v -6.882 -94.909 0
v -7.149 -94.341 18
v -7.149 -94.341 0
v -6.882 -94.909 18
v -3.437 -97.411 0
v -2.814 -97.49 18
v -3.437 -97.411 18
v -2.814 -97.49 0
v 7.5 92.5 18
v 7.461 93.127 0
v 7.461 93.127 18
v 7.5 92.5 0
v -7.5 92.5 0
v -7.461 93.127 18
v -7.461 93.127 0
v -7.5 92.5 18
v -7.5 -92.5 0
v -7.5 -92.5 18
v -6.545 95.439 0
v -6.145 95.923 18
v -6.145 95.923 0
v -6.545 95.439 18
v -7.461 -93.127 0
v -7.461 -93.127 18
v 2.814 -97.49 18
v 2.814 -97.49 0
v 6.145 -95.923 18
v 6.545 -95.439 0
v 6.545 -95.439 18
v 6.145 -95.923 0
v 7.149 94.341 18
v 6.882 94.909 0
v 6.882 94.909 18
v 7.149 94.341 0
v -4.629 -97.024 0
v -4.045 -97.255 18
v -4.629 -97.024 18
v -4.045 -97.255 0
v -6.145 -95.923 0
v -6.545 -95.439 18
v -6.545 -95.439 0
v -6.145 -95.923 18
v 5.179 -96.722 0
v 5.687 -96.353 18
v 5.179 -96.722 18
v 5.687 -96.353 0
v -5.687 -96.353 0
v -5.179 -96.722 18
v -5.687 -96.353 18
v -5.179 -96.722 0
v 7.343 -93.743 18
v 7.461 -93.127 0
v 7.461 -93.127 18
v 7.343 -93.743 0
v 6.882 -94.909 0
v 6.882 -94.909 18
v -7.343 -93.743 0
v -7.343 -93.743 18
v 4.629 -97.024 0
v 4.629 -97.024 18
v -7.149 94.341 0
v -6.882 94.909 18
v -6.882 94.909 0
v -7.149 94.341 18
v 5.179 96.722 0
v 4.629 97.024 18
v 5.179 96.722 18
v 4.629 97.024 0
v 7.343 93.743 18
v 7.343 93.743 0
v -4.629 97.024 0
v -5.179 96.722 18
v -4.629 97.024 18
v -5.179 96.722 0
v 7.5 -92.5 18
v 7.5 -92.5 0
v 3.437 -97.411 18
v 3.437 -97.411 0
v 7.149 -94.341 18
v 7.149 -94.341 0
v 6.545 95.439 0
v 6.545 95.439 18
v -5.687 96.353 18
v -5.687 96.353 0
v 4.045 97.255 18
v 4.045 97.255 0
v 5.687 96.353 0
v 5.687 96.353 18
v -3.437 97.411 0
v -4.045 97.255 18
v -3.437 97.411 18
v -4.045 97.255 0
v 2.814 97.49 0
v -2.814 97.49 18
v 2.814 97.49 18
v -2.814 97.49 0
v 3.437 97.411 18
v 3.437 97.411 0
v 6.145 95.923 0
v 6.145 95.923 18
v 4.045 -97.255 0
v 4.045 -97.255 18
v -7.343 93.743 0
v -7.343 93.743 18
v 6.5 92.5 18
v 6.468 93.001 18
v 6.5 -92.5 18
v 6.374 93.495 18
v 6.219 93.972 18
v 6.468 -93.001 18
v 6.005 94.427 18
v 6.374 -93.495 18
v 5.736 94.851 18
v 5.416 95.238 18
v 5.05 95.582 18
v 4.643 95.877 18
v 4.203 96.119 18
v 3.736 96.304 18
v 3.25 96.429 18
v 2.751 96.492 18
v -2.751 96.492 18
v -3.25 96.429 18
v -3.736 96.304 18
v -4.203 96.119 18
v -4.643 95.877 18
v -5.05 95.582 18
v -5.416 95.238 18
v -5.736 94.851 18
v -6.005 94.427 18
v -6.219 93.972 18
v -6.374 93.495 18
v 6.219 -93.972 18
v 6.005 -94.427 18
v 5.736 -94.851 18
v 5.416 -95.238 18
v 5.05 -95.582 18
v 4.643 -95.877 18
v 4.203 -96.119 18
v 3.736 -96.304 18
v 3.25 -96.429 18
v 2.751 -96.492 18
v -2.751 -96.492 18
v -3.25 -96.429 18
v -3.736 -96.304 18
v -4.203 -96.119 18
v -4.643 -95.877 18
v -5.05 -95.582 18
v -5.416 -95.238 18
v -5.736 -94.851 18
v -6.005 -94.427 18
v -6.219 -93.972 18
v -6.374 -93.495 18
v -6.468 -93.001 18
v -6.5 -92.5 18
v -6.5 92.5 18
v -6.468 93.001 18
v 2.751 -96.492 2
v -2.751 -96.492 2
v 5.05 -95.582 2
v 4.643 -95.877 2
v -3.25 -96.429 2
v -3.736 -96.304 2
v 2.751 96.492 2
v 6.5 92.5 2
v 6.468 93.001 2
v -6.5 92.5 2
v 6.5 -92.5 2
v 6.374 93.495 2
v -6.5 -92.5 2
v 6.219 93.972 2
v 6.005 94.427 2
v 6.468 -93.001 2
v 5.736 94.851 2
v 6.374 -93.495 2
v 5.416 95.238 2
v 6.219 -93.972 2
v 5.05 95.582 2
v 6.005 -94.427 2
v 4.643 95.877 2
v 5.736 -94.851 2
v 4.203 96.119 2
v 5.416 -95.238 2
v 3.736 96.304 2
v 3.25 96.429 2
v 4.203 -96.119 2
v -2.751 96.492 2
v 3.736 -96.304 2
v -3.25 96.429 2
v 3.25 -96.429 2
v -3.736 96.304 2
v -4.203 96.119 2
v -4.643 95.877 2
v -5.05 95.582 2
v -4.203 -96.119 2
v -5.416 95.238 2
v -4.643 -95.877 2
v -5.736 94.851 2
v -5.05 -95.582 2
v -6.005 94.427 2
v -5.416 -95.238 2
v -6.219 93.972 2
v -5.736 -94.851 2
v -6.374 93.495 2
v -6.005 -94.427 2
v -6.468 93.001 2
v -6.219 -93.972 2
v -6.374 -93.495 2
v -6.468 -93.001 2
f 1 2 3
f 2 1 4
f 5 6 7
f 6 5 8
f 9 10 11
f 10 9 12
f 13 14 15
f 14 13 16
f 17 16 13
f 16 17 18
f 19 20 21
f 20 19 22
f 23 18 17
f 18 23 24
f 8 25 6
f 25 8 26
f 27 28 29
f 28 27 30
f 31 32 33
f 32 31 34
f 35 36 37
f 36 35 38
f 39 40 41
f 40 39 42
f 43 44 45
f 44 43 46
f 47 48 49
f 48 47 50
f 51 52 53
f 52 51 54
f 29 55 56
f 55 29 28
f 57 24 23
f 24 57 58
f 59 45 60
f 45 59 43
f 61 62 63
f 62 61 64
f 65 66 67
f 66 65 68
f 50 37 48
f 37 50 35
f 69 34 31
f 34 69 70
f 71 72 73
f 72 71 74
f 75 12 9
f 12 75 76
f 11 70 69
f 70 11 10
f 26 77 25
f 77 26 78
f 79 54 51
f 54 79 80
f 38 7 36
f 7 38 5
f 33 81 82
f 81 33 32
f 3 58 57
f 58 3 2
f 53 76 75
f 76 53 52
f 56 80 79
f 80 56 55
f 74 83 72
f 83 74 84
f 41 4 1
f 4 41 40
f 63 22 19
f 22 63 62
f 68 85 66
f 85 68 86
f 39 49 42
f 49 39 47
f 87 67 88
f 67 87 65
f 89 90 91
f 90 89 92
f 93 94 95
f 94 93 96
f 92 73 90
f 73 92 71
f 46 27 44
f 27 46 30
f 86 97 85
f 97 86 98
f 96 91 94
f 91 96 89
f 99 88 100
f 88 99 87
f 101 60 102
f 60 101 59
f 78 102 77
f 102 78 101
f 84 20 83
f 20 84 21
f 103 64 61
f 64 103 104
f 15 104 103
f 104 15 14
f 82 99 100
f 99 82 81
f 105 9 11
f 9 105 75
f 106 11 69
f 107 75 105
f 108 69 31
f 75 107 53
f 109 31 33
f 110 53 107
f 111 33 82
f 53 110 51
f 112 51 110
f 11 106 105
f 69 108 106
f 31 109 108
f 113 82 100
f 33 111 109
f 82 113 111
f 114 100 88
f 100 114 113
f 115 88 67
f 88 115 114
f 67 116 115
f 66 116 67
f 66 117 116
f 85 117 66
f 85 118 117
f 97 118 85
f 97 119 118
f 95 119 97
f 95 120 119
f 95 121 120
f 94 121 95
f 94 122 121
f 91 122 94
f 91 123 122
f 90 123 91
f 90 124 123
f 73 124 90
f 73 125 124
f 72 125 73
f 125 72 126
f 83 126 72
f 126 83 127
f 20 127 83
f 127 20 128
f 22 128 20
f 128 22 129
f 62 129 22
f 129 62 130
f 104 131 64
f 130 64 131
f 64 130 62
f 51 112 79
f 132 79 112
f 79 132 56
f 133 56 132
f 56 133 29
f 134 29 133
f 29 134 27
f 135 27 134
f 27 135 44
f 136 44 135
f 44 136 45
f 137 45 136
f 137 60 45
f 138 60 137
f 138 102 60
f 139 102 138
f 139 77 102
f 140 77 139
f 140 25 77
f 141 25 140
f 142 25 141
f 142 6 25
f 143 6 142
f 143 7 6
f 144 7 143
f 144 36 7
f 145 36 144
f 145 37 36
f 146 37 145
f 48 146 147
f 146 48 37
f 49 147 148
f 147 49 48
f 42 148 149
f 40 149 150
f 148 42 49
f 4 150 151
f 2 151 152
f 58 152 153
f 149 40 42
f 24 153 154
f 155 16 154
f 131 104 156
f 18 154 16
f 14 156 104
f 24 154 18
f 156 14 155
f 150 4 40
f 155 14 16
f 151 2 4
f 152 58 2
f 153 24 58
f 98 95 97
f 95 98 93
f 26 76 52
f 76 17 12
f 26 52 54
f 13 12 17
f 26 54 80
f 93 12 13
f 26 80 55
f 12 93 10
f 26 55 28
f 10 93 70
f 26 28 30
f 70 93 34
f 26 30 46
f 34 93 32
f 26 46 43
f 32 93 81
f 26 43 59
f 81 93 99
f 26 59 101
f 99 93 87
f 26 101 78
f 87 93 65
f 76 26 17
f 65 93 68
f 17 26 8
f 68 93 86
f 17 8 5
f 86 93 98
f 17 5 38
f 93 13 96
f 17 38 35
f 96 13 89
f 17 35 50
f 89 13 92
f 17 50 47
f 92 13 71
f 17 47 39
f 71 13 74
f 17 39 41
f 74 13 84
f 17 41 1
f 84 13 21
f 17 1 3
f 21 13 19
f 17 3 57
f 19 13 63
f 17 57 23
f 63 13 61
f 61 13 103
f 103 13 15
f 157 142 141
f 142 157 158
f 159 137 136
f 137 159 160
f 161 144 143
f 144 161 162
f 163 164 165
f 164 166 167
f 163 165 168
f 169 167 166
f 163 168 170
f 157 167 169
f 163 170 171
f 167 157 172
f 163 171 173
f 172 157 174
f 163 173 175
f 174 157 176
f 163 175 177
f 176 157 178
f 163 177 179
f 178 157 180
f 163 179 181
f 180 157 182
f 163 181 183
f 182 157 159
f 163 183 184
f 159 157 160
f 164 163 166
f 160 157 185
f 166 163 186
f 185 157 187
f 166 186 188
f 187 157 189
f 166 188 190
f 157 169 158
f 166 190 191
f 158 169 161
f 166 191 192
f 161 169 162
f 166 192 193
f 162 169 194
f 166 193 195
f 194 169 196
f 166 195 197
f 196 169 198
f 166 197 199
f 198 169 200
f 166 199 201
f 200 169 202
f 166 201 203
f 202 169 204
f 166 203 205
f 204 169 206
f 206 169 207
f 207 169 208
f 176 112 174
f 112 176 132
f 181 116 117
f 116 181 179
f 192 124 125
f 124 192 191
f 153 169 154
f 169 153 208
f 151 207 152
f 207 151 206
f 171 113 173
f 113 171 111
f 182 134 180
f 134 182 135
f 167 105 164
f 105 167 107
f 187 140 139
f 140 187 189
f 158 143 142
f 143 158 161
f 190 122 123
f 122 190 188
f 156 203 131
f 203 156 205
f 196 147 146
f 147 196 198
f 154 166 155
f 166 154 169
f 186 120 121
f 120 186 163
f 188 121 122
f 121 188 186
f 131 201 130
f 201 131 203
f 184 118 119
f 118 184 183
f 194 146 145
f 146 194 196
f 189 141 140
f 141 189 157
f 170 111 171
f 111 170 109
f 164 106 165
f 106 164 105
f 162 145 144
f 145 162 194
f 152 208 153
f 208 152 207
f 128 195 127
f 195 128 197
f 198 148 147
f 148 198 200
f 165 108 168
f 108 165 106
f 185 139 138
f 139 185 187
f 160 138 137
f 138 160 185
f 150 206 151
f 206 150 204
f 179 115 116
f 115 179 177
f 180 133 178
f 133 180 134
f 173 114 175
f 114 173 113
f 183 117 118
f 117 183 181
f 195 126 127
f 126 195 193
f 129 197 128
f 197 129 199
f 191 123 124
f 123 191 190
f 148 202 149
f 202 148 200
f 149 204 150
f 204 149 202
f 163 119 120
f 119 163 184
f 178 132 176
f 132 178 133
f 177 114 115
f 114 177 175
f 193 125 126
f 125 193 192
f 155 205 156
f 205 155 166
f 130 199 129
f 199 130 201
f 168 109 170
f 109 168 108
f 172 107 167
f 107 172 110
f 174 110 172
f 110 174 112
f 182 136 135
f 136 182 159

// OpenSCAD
$fn = 50;


difference() {
	union() {
		hull() {
			translate(v = [-2.5000000000, 92.5000000000, 0]) {
				cylinder(h = 18, r = 5);
			}
			translate(v = [2.5000000000, 92.5000000000, 0]) {
				cylinder(h = 18, r = 5);
			}
			translate(v = [-2.5000000000, -92.5000000000, 0]) {
				cylinder(h = 18, r = 5);
			}
			translate(v = [2.5000000000, -92.5000000000, 0]) {
				cylinder(h = 18, r = 5);
			}
		}
	}
	union() {
		translate(v = [0, 0, 2]) {
			hull() {
				translate(v = [-2.5000000000, 92.5000000000, 0]) {
					cylinder(h = 16, r = 4);
				}
				translate(v = [2.5000000000, 92.5000000000, 0]) {
					cylinder(h = 16, r = 4);
				}
				translate(v = [-2.5000000000, -92.5000000000, 0]) {
					cylinder(h = 16, r = 4);
				}
				translate(v = [2.5000000000, -92.5000000000, 0]) {
					cylinder(h = 16, r = 4);
				}
			}
		}
	}
}
